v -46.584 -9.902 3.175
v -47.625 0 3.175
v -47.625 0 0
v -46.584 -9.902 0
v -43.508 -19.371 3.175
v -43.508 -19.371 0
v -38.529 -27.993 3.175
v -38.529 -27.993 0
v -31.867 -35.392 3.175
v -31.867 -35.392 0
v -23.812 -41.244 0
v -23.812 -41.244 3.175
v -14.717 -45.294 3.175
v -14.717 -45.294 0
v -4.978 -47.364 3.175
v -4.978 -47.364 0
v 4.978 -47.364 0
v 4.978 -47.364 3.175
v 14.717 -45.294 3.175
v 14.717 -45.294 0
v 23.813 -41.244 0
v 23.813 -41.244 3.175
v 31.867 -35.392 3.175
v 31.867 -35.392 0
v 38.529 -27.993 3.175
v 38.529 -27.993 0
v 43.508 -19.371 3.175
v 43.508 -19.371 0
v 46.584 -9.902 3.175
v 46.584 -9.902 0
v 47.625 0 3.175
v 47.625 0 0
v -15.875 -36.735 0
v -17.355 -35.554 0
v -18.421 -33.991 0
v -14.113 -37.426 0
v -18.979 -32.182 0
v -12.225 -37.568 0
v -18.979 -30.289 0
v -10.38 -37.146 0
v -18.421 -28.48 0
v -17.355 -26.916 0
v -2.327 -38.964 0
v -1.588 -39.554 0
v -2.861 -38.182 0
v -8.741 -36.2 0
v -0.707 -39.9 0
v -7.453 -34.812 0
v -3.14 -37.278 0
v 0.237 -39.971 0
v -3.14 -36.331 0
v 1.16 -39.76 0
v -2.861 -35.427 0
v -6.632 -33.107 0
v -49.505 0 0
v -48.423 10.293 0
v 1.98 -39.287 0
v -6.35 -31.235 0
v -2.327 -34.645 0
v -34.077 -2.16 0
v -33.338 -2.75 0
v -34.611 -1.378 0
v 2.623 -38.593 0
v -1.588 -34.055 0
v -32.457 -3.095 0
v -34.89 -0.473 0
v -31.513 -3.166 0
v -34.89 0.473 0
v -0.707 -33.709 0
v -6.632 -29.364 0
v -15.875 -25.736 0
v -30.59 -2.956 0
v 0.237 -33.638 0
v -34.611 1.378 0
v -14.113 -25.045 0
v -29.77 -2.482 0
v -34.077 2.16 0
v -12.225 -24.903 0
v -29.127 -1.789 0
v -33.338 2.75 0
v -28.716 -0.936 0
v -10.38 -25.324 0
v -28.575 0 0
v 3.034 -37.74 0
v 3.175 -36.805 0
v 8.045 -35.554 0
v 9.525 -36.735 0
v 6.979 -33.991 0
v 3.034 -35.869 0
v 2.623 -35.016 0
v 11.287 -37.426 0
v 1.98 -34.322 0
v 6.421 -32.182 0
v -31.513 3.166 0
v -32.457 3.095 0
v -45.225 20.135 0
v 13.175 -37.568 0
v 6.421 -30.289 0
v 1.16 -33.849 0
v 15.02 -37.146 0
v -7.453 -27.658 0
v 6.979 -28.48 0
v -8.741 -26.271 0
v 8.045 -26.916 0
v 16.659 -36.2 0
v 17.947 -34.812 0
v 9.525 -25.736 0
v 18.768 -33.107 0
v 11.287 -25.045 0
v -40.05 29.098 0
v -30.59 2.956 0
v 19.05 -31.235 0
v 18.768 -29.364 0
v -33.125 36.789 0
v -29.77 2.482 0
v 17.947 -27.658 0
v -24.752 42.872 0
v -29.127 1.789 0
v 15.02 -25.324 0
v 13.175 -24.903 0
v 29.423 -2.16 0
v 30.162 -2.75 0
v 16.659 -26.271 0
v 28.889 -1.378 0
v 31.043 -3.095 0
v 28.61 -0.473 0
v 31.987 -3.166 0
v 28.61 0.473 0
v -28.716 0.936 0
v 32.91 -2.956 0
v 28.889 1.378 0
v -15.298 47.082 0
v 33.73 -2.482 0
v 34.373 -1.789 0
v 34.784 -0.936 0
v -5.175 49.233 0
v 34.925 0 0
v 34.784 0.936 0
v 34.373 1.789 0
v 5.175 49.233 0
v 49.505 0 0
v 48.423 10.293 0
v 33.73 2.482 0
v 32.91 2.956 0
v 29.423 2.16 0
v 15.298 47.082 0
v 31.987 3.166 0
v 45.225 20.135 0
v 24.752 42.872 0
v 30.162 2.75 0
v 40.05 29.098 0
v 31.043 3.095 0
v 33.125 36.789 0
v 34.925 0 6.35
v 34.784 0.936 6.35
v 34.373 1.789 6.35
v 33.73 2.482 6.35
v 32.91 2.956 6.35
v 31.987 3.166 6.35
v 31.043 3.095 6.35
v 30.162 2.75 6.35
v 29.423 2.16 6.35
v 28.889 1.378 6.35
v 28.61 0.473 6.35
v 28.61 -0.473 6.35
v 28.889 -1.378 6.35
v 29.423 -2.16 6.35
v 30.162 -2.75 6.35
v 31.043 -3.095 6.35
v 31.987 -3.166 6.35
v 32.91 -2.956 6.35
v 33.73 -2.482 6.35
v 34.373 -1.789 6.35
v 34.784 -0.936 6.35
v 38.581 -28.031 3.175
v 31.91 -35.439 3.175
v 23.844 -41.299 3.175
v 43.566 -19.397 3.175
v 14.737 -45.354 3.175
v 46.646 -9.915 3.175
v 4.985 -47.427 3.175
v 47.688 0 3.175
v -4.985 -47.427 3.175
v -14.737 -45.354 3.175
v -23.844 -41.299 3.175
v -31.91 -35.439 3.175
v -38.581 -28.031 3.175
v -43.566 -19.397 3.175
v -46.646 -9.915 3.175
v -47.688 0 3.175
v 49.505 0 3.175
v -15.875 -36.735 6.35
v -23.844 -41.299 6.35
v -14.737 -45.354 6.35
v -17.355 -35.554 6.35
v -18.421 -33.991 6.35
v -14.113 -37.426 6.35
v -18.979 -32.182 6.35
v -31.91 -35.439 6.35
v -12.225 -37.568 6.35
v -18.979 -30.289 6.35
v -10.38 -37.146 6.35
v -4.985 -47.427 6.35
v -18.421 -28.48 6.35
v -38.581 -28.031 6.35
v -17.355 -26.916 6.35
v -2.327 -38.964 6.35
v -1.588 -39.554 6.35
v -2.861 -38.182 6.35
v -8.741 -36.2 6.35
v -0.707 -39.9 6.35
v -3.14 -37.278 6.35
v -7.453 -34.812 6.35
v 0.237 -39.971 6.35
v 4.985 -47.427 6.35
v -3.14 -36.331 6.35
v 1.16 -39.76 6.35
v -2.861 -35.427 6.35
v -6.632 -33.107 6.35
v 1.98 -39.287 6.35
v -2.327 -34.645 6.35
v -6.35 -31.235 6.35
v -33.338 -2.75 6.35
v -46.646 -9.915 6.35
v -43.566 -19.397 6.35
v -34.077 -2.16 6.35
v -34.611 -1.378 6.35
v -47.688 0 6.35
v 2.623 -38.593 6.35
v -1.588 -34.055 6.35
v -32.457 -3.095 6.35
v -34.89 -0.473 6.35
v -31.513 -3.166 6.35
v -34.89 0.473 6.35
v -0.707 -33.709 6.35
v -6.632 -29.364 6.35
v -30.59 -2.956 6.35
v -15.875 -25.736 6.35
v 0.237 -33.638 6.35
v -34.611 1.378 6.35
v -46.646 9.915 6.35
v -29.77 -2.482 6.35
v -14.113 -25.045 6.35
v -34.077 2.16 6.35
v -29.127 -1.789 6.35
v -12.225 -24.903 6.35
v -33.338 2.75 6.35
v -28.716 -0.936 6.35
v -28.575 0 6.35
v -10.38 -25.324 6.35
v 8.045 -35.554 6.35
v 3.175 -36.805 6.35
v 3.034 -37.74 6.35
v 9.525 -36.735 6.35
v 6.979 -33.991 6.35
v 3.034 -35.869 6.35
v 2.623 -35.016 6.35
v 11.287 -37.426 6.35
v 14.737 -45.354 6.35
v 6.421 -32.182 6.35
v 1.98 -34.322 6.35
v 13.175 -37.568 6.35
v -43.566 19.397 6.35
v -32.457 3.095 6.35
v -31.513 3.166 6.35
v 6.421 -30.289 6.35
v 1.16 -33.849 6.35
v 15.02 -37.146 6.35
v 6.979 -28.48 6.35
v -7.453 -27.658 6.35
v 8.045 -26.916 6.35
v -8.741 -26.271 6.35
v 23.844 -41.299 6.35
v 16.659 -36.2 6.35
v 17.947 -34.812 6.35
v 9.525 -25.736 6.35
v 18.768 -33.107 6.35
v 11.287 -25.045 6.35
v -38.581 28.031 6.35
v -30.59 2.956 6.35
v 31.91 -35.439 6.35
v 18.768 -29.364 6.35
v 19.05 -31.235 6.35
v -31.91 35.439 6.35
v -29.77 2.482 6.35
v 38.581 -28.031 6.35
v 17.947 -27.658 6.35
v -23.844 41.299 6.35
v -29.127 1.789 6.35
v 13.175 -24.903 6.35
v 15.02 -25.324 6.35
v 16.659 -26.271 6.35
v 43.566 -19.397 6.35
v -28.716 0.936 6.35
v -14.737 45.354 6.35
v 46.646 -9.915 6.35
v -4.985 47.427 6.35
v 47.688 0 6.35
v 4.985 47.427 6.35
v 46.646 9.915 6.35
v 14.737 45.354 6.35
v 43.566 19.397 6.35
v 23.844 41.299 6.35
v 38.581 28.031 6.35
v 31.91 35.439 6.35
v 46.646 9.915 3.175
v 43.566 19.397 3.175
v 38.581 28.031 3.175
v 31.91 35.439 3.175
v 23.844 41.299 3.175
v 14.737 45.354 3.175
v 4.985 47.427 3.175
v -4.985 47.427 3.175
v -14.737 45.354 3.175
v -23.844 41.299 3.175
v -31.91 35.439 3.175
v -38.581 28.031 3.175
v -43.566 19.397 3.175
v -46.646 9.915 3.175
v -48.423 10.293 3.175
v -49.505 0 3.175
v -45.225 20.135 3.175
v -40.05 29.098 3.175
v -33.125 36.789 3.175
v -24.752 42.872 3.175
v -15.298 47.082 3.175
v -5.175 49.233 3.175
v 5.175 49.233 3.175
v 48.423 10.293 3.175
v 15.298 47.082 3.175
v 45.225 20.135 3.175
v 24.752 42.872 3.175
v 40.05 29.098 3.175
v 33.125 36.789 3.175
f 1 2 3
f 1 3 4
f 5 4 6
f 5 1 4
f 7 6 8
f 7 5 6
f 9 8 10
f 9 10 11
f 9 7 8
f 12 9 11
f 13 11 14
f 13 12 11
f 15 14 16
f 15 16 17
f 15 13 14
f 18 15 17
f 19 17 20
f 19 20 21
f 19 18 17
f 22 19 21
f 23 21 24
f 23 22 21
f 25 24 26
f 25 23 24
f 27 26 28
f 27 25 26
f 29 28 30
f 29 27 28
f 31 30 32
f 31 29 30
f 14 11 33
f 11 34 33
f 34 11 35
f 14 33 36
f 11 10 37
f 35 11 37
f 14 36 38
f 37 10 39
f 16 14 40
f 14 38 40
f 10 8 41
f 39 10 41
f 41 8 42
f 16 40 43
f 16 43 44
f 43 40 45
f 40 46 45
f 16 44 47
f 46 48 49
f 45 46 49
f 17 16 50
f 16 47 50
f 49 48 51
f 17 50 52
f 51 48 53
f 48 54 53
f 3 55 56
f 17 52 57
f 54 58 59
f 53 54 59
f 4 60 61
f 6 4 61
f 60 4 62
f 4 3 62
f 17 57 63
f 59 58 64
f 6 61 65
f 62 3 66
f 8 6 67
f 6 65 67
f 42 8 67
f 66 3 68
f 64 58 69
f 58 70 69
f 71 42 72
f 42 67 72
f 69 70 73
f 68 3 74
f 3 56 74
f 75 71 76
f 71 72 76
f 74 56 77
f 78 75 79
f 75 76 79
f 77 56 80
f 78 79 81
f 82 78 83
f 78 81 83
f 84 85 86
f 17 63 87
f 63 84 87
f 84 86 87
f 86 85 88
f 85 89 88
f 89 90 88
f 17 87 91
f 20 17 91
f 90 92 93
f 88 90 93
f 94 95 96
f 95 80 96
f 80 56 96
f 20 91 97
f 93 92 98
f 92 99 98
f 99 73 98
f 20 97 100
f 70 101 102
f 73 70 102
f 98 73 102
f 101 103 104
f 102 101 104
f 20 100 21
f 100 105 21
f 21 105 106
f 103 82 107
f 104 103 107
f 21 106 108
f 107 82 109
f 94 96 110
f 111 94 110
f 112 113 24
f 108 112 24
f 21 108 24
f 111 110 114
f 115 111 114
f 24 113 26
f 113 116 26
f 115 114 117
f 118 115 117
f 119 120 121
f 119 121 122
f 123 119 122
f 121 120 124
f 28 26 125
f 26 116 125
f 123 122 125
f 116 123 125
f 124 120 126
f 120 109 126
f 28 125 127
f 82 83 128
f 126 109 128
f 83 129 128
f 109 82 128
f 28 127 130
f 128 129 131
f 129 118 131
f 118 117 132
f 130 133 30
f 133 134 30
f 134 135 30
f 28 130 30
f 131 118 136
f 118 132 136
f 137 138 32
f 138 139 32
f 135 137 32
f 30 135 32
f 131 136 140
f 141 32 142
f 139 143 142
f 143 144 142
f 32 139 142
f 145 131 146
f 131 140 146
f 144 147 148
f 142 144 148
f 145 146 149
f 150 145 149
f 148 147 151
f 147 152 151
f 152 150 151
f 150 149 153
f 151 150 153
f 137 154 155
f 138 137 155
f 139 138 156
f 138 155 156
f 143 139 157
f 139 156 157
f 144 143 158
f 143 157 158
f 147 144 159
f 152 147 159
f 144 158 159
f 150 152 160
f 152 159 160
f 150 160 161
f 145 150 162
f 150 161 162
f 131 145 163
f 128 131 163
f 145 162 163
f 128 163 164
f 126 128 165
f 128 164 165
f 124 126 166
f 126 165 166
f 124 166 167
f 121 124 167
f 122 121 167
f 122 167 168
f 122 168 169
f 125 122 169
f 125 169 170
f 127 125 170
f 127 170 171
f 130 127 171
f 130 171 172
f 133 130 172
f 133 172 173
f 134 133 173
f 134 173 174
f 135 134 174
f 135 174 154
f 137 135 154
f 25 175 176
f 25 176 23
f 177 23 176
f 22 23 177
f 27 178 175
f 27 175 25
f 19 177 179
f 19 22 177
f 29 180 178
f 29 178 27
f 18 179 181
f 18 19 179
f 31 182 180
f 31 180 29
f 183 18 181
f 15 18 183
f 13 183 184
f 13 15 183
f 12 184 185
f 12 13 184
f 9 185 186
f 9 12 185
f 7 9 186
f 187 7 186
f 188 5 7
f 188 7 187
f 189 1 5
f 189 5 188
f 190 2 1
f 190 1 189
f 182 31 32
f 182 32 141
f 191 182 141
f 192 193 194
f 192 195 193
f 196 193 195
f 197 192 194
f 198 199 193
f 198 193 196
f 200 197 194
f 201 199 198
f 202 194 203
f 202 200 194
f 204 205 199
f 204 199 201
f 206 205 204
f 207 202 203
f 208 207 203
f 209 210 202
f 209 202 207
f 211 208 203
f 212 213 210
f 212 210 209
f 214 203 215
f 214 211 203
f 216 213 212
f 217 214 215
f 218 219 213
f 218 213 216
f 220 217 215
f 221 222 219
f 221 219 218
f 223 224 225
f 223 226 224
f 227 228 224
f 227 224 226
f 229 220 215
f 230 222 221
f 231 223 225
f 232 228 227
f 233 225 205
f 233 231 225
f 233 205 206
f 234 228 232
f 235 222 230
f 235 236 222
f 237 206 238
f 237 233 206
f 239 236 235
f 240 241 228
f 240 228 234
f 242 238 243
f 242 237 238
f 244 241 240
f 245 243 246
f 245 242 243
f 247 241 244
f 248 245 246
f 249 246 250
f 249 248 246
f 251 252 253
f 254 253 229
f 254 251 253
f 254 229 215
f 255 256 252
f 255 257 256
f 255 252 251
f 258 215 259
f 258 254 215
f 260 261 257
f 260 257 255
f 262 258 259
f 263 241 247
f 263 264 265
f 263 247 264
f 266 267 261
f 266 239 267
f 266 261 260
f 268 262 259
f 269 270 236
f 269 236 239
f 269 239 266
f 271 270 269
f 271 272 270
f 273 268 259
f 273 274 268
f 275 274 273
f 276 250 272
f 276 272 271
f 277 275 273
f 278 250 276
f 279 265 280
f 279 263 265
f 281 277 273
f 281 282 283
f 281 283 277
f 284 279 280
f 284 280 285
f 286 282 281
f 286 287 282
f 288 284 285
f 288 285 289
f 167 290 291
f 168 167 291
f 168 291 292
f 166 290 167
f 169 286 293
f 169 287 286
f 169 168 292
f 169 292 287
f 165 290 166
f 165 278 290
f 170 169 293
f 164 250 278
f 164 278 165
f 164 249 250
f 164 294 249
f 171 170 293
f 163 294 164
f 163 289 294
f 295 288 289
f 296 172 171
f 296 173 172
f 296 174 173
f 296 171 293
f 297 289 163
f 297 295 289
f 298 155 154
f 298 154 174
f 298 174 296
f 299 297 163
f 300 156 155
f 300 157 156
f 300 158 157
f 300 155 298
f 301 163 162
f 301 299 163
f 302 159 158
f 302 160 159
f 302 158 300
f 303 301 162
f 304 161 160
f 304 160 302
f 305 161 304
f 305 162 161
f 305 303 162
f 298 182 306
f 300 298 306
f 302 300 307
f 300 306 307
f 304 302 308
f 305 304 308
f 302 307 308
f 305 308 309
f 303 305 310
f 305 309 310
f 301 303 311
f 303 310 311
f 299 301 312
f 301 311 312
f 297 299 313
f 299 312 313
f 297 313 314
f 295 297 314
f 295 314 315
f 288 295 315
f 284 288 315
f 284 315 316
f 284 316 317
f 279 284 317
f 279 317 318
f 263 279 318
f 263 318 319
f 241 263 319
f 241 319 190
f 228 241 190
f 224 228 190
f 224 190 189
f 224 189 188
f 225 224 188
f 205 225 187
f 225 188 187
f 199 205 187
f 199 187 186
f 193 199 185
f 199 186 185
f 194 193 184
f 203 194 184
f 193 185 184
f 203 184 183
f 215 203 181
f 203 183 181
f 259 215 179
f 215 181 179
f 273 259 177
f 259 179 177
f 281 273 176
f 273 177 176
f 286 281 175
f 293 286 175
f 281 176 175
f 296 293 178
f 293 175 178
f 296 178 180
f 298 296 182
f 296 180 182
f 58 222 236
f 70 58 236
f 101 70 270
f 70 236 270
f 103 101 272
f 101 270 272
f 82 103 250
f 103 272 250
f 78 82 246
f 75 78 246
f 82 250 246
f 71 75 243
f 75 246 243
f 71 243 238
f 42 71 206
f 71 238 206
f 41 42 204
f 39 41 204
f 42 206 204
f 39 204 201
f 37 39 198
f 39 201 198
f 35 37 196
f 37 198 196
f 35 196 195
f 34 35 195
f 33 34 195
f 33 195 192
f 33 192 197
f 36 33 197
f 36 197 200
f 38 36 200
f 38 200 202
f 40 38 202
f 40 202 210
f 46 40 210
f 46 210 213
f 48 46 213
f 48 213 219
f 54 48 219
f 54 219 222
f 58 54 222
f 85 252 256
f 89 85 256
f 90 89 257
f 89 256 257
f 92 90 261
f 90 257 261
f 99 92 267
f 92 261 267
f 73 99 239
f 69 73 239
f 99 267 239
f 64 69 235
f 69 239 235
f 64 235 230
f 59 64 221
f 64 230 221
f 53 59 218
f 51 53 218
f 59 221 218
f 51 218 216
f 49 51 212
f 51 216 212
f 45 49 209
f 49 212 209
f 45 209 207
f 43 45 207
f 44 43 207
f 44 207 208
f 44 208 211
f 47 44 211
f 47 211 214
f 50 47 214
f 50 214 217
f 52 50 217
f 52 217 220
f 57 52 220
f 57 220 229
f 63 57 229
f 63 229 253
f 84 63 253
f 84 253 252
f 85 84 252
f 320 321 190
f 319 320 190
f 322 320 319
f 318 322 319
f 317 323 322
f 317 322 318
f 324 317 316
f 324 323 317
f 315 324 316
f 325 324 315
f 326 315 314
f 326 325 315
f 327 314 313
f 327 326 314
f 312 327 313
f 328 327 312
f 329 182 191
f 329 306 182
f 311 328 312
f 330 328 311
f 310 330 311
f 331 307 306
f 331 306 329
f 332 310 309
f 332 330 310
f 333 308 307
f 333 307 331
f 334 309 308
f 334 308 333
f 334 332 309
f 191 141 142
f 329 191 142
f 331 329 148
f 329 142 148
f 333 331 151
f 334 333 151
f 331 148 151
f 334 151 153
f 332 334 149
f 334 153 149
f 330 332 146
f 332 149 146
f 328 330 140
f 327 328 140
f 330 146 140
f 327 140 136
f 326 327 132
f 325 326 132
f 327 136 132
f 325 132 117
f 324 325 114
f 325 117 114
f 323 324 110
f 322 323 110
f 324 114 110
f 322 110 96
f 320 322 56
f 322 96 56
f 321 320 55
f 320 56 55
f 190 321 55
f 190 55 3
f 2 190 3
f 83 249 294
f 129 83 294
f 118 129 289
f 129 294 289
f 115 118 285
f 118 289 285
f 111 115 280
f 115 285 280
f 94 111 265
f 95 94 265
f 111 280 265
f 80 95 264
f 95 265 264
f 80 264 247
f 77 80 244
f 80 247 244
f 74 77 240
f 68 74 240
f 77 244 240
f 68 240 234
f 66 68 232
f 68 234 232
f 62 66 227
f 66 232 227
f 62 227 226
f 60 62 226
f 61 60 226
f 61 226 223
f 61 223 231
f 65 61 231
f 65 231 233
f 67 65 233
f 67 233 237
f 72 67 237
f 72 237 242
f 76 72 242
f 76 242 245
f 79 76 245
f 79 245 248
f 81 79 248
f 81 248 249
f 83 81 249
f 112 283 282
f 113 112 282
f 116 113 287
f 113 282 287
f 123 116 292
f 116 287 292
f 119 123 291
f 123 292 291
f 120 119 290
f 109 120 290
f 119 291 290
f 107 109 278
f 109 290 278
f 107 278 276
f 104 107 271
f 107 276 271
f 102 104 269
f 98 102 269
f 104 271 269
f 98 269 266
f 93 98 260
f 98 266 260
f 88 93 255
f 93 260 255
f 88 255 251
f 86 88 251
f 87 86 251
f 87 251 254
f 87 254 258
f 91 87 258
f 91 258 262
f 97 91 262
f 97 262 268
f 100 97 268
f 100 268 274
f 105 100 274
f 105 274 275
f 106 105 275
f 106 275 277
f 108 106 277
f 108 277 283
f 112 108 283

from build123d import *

# Parameters (mm, degrees)
SKETCH1_R           = 49.5046
BOSS_EXTRUDE1_DEPTH = 3.175
SKETCH2_R           = 47.6885
BOSS_EXTRUDE2_DEPTH = 3.175
SKETCH3_R           = 3.175
SKETCH3_R_2         = 6.35
CUT_EXTRUDE1_DEPTH  = 7.35
CUT_EXTRUDE2_DEPTH  = 4.175


with BuildPart() as part:
    # Sketch1 → Boss-Extrude1 (new body)
    with BuildSketch(Plane.XY):
        Circle(SKETCH1_R)
    extrude(amount=BOSS_EXTRUDE1_DEPTH)

    # Sketch2 → Boss-Extrude2 (add)
    with BuildSketch(Plane.XY.offset(3.175)):
        Circle(SKETCH2_R)
    extrude(amount=BOSS_EXTRUDE2_DEPTH)

    # Sketch3 → Cut-Extrude1 (cut, through all)
    with BuildSketch(Plane.XY.offset(6.35)):
        with Locations((-31.75, 0)):
            Circle(SKETCH3_R)
        with Locations((31.75, 0)):
            Circle(SKETCH3_R)
        with Locations((-12.7, -31.235352443)):
            Circle(SKETCH3_R_2)
        with Locations((12.7, -31.235352443)):
            Circle(SKETCH3_R_2)
        with Locations((0, -36.8046)):
            Circle(SKETCH3_R)
    extrude(amount=-CUT_EXTRUDE1_DEPTH, mode=Mode.SUBTRACT)

    # Sketch4 → Cut-Extrude2 (cut, through all)
    with BuildSketch(Plane.XY.offset(3.175)):
        with BuildLine():
            Line((-50.165, 0), (-47.625, 0))
            ThreePointArc((-47.625, 0), (0, -47.625), (47.625, 0))
            Line((47.625, 0), (50.165, 0))
            ThreePointArc((50.165, 0), (0, -50.165), (-50.165, 0))
        make_face()
    extrude(amount=-CUT_EXTRUDE2_DEPTH, mode=Mode.SUBTRACT)


solid = part.part
